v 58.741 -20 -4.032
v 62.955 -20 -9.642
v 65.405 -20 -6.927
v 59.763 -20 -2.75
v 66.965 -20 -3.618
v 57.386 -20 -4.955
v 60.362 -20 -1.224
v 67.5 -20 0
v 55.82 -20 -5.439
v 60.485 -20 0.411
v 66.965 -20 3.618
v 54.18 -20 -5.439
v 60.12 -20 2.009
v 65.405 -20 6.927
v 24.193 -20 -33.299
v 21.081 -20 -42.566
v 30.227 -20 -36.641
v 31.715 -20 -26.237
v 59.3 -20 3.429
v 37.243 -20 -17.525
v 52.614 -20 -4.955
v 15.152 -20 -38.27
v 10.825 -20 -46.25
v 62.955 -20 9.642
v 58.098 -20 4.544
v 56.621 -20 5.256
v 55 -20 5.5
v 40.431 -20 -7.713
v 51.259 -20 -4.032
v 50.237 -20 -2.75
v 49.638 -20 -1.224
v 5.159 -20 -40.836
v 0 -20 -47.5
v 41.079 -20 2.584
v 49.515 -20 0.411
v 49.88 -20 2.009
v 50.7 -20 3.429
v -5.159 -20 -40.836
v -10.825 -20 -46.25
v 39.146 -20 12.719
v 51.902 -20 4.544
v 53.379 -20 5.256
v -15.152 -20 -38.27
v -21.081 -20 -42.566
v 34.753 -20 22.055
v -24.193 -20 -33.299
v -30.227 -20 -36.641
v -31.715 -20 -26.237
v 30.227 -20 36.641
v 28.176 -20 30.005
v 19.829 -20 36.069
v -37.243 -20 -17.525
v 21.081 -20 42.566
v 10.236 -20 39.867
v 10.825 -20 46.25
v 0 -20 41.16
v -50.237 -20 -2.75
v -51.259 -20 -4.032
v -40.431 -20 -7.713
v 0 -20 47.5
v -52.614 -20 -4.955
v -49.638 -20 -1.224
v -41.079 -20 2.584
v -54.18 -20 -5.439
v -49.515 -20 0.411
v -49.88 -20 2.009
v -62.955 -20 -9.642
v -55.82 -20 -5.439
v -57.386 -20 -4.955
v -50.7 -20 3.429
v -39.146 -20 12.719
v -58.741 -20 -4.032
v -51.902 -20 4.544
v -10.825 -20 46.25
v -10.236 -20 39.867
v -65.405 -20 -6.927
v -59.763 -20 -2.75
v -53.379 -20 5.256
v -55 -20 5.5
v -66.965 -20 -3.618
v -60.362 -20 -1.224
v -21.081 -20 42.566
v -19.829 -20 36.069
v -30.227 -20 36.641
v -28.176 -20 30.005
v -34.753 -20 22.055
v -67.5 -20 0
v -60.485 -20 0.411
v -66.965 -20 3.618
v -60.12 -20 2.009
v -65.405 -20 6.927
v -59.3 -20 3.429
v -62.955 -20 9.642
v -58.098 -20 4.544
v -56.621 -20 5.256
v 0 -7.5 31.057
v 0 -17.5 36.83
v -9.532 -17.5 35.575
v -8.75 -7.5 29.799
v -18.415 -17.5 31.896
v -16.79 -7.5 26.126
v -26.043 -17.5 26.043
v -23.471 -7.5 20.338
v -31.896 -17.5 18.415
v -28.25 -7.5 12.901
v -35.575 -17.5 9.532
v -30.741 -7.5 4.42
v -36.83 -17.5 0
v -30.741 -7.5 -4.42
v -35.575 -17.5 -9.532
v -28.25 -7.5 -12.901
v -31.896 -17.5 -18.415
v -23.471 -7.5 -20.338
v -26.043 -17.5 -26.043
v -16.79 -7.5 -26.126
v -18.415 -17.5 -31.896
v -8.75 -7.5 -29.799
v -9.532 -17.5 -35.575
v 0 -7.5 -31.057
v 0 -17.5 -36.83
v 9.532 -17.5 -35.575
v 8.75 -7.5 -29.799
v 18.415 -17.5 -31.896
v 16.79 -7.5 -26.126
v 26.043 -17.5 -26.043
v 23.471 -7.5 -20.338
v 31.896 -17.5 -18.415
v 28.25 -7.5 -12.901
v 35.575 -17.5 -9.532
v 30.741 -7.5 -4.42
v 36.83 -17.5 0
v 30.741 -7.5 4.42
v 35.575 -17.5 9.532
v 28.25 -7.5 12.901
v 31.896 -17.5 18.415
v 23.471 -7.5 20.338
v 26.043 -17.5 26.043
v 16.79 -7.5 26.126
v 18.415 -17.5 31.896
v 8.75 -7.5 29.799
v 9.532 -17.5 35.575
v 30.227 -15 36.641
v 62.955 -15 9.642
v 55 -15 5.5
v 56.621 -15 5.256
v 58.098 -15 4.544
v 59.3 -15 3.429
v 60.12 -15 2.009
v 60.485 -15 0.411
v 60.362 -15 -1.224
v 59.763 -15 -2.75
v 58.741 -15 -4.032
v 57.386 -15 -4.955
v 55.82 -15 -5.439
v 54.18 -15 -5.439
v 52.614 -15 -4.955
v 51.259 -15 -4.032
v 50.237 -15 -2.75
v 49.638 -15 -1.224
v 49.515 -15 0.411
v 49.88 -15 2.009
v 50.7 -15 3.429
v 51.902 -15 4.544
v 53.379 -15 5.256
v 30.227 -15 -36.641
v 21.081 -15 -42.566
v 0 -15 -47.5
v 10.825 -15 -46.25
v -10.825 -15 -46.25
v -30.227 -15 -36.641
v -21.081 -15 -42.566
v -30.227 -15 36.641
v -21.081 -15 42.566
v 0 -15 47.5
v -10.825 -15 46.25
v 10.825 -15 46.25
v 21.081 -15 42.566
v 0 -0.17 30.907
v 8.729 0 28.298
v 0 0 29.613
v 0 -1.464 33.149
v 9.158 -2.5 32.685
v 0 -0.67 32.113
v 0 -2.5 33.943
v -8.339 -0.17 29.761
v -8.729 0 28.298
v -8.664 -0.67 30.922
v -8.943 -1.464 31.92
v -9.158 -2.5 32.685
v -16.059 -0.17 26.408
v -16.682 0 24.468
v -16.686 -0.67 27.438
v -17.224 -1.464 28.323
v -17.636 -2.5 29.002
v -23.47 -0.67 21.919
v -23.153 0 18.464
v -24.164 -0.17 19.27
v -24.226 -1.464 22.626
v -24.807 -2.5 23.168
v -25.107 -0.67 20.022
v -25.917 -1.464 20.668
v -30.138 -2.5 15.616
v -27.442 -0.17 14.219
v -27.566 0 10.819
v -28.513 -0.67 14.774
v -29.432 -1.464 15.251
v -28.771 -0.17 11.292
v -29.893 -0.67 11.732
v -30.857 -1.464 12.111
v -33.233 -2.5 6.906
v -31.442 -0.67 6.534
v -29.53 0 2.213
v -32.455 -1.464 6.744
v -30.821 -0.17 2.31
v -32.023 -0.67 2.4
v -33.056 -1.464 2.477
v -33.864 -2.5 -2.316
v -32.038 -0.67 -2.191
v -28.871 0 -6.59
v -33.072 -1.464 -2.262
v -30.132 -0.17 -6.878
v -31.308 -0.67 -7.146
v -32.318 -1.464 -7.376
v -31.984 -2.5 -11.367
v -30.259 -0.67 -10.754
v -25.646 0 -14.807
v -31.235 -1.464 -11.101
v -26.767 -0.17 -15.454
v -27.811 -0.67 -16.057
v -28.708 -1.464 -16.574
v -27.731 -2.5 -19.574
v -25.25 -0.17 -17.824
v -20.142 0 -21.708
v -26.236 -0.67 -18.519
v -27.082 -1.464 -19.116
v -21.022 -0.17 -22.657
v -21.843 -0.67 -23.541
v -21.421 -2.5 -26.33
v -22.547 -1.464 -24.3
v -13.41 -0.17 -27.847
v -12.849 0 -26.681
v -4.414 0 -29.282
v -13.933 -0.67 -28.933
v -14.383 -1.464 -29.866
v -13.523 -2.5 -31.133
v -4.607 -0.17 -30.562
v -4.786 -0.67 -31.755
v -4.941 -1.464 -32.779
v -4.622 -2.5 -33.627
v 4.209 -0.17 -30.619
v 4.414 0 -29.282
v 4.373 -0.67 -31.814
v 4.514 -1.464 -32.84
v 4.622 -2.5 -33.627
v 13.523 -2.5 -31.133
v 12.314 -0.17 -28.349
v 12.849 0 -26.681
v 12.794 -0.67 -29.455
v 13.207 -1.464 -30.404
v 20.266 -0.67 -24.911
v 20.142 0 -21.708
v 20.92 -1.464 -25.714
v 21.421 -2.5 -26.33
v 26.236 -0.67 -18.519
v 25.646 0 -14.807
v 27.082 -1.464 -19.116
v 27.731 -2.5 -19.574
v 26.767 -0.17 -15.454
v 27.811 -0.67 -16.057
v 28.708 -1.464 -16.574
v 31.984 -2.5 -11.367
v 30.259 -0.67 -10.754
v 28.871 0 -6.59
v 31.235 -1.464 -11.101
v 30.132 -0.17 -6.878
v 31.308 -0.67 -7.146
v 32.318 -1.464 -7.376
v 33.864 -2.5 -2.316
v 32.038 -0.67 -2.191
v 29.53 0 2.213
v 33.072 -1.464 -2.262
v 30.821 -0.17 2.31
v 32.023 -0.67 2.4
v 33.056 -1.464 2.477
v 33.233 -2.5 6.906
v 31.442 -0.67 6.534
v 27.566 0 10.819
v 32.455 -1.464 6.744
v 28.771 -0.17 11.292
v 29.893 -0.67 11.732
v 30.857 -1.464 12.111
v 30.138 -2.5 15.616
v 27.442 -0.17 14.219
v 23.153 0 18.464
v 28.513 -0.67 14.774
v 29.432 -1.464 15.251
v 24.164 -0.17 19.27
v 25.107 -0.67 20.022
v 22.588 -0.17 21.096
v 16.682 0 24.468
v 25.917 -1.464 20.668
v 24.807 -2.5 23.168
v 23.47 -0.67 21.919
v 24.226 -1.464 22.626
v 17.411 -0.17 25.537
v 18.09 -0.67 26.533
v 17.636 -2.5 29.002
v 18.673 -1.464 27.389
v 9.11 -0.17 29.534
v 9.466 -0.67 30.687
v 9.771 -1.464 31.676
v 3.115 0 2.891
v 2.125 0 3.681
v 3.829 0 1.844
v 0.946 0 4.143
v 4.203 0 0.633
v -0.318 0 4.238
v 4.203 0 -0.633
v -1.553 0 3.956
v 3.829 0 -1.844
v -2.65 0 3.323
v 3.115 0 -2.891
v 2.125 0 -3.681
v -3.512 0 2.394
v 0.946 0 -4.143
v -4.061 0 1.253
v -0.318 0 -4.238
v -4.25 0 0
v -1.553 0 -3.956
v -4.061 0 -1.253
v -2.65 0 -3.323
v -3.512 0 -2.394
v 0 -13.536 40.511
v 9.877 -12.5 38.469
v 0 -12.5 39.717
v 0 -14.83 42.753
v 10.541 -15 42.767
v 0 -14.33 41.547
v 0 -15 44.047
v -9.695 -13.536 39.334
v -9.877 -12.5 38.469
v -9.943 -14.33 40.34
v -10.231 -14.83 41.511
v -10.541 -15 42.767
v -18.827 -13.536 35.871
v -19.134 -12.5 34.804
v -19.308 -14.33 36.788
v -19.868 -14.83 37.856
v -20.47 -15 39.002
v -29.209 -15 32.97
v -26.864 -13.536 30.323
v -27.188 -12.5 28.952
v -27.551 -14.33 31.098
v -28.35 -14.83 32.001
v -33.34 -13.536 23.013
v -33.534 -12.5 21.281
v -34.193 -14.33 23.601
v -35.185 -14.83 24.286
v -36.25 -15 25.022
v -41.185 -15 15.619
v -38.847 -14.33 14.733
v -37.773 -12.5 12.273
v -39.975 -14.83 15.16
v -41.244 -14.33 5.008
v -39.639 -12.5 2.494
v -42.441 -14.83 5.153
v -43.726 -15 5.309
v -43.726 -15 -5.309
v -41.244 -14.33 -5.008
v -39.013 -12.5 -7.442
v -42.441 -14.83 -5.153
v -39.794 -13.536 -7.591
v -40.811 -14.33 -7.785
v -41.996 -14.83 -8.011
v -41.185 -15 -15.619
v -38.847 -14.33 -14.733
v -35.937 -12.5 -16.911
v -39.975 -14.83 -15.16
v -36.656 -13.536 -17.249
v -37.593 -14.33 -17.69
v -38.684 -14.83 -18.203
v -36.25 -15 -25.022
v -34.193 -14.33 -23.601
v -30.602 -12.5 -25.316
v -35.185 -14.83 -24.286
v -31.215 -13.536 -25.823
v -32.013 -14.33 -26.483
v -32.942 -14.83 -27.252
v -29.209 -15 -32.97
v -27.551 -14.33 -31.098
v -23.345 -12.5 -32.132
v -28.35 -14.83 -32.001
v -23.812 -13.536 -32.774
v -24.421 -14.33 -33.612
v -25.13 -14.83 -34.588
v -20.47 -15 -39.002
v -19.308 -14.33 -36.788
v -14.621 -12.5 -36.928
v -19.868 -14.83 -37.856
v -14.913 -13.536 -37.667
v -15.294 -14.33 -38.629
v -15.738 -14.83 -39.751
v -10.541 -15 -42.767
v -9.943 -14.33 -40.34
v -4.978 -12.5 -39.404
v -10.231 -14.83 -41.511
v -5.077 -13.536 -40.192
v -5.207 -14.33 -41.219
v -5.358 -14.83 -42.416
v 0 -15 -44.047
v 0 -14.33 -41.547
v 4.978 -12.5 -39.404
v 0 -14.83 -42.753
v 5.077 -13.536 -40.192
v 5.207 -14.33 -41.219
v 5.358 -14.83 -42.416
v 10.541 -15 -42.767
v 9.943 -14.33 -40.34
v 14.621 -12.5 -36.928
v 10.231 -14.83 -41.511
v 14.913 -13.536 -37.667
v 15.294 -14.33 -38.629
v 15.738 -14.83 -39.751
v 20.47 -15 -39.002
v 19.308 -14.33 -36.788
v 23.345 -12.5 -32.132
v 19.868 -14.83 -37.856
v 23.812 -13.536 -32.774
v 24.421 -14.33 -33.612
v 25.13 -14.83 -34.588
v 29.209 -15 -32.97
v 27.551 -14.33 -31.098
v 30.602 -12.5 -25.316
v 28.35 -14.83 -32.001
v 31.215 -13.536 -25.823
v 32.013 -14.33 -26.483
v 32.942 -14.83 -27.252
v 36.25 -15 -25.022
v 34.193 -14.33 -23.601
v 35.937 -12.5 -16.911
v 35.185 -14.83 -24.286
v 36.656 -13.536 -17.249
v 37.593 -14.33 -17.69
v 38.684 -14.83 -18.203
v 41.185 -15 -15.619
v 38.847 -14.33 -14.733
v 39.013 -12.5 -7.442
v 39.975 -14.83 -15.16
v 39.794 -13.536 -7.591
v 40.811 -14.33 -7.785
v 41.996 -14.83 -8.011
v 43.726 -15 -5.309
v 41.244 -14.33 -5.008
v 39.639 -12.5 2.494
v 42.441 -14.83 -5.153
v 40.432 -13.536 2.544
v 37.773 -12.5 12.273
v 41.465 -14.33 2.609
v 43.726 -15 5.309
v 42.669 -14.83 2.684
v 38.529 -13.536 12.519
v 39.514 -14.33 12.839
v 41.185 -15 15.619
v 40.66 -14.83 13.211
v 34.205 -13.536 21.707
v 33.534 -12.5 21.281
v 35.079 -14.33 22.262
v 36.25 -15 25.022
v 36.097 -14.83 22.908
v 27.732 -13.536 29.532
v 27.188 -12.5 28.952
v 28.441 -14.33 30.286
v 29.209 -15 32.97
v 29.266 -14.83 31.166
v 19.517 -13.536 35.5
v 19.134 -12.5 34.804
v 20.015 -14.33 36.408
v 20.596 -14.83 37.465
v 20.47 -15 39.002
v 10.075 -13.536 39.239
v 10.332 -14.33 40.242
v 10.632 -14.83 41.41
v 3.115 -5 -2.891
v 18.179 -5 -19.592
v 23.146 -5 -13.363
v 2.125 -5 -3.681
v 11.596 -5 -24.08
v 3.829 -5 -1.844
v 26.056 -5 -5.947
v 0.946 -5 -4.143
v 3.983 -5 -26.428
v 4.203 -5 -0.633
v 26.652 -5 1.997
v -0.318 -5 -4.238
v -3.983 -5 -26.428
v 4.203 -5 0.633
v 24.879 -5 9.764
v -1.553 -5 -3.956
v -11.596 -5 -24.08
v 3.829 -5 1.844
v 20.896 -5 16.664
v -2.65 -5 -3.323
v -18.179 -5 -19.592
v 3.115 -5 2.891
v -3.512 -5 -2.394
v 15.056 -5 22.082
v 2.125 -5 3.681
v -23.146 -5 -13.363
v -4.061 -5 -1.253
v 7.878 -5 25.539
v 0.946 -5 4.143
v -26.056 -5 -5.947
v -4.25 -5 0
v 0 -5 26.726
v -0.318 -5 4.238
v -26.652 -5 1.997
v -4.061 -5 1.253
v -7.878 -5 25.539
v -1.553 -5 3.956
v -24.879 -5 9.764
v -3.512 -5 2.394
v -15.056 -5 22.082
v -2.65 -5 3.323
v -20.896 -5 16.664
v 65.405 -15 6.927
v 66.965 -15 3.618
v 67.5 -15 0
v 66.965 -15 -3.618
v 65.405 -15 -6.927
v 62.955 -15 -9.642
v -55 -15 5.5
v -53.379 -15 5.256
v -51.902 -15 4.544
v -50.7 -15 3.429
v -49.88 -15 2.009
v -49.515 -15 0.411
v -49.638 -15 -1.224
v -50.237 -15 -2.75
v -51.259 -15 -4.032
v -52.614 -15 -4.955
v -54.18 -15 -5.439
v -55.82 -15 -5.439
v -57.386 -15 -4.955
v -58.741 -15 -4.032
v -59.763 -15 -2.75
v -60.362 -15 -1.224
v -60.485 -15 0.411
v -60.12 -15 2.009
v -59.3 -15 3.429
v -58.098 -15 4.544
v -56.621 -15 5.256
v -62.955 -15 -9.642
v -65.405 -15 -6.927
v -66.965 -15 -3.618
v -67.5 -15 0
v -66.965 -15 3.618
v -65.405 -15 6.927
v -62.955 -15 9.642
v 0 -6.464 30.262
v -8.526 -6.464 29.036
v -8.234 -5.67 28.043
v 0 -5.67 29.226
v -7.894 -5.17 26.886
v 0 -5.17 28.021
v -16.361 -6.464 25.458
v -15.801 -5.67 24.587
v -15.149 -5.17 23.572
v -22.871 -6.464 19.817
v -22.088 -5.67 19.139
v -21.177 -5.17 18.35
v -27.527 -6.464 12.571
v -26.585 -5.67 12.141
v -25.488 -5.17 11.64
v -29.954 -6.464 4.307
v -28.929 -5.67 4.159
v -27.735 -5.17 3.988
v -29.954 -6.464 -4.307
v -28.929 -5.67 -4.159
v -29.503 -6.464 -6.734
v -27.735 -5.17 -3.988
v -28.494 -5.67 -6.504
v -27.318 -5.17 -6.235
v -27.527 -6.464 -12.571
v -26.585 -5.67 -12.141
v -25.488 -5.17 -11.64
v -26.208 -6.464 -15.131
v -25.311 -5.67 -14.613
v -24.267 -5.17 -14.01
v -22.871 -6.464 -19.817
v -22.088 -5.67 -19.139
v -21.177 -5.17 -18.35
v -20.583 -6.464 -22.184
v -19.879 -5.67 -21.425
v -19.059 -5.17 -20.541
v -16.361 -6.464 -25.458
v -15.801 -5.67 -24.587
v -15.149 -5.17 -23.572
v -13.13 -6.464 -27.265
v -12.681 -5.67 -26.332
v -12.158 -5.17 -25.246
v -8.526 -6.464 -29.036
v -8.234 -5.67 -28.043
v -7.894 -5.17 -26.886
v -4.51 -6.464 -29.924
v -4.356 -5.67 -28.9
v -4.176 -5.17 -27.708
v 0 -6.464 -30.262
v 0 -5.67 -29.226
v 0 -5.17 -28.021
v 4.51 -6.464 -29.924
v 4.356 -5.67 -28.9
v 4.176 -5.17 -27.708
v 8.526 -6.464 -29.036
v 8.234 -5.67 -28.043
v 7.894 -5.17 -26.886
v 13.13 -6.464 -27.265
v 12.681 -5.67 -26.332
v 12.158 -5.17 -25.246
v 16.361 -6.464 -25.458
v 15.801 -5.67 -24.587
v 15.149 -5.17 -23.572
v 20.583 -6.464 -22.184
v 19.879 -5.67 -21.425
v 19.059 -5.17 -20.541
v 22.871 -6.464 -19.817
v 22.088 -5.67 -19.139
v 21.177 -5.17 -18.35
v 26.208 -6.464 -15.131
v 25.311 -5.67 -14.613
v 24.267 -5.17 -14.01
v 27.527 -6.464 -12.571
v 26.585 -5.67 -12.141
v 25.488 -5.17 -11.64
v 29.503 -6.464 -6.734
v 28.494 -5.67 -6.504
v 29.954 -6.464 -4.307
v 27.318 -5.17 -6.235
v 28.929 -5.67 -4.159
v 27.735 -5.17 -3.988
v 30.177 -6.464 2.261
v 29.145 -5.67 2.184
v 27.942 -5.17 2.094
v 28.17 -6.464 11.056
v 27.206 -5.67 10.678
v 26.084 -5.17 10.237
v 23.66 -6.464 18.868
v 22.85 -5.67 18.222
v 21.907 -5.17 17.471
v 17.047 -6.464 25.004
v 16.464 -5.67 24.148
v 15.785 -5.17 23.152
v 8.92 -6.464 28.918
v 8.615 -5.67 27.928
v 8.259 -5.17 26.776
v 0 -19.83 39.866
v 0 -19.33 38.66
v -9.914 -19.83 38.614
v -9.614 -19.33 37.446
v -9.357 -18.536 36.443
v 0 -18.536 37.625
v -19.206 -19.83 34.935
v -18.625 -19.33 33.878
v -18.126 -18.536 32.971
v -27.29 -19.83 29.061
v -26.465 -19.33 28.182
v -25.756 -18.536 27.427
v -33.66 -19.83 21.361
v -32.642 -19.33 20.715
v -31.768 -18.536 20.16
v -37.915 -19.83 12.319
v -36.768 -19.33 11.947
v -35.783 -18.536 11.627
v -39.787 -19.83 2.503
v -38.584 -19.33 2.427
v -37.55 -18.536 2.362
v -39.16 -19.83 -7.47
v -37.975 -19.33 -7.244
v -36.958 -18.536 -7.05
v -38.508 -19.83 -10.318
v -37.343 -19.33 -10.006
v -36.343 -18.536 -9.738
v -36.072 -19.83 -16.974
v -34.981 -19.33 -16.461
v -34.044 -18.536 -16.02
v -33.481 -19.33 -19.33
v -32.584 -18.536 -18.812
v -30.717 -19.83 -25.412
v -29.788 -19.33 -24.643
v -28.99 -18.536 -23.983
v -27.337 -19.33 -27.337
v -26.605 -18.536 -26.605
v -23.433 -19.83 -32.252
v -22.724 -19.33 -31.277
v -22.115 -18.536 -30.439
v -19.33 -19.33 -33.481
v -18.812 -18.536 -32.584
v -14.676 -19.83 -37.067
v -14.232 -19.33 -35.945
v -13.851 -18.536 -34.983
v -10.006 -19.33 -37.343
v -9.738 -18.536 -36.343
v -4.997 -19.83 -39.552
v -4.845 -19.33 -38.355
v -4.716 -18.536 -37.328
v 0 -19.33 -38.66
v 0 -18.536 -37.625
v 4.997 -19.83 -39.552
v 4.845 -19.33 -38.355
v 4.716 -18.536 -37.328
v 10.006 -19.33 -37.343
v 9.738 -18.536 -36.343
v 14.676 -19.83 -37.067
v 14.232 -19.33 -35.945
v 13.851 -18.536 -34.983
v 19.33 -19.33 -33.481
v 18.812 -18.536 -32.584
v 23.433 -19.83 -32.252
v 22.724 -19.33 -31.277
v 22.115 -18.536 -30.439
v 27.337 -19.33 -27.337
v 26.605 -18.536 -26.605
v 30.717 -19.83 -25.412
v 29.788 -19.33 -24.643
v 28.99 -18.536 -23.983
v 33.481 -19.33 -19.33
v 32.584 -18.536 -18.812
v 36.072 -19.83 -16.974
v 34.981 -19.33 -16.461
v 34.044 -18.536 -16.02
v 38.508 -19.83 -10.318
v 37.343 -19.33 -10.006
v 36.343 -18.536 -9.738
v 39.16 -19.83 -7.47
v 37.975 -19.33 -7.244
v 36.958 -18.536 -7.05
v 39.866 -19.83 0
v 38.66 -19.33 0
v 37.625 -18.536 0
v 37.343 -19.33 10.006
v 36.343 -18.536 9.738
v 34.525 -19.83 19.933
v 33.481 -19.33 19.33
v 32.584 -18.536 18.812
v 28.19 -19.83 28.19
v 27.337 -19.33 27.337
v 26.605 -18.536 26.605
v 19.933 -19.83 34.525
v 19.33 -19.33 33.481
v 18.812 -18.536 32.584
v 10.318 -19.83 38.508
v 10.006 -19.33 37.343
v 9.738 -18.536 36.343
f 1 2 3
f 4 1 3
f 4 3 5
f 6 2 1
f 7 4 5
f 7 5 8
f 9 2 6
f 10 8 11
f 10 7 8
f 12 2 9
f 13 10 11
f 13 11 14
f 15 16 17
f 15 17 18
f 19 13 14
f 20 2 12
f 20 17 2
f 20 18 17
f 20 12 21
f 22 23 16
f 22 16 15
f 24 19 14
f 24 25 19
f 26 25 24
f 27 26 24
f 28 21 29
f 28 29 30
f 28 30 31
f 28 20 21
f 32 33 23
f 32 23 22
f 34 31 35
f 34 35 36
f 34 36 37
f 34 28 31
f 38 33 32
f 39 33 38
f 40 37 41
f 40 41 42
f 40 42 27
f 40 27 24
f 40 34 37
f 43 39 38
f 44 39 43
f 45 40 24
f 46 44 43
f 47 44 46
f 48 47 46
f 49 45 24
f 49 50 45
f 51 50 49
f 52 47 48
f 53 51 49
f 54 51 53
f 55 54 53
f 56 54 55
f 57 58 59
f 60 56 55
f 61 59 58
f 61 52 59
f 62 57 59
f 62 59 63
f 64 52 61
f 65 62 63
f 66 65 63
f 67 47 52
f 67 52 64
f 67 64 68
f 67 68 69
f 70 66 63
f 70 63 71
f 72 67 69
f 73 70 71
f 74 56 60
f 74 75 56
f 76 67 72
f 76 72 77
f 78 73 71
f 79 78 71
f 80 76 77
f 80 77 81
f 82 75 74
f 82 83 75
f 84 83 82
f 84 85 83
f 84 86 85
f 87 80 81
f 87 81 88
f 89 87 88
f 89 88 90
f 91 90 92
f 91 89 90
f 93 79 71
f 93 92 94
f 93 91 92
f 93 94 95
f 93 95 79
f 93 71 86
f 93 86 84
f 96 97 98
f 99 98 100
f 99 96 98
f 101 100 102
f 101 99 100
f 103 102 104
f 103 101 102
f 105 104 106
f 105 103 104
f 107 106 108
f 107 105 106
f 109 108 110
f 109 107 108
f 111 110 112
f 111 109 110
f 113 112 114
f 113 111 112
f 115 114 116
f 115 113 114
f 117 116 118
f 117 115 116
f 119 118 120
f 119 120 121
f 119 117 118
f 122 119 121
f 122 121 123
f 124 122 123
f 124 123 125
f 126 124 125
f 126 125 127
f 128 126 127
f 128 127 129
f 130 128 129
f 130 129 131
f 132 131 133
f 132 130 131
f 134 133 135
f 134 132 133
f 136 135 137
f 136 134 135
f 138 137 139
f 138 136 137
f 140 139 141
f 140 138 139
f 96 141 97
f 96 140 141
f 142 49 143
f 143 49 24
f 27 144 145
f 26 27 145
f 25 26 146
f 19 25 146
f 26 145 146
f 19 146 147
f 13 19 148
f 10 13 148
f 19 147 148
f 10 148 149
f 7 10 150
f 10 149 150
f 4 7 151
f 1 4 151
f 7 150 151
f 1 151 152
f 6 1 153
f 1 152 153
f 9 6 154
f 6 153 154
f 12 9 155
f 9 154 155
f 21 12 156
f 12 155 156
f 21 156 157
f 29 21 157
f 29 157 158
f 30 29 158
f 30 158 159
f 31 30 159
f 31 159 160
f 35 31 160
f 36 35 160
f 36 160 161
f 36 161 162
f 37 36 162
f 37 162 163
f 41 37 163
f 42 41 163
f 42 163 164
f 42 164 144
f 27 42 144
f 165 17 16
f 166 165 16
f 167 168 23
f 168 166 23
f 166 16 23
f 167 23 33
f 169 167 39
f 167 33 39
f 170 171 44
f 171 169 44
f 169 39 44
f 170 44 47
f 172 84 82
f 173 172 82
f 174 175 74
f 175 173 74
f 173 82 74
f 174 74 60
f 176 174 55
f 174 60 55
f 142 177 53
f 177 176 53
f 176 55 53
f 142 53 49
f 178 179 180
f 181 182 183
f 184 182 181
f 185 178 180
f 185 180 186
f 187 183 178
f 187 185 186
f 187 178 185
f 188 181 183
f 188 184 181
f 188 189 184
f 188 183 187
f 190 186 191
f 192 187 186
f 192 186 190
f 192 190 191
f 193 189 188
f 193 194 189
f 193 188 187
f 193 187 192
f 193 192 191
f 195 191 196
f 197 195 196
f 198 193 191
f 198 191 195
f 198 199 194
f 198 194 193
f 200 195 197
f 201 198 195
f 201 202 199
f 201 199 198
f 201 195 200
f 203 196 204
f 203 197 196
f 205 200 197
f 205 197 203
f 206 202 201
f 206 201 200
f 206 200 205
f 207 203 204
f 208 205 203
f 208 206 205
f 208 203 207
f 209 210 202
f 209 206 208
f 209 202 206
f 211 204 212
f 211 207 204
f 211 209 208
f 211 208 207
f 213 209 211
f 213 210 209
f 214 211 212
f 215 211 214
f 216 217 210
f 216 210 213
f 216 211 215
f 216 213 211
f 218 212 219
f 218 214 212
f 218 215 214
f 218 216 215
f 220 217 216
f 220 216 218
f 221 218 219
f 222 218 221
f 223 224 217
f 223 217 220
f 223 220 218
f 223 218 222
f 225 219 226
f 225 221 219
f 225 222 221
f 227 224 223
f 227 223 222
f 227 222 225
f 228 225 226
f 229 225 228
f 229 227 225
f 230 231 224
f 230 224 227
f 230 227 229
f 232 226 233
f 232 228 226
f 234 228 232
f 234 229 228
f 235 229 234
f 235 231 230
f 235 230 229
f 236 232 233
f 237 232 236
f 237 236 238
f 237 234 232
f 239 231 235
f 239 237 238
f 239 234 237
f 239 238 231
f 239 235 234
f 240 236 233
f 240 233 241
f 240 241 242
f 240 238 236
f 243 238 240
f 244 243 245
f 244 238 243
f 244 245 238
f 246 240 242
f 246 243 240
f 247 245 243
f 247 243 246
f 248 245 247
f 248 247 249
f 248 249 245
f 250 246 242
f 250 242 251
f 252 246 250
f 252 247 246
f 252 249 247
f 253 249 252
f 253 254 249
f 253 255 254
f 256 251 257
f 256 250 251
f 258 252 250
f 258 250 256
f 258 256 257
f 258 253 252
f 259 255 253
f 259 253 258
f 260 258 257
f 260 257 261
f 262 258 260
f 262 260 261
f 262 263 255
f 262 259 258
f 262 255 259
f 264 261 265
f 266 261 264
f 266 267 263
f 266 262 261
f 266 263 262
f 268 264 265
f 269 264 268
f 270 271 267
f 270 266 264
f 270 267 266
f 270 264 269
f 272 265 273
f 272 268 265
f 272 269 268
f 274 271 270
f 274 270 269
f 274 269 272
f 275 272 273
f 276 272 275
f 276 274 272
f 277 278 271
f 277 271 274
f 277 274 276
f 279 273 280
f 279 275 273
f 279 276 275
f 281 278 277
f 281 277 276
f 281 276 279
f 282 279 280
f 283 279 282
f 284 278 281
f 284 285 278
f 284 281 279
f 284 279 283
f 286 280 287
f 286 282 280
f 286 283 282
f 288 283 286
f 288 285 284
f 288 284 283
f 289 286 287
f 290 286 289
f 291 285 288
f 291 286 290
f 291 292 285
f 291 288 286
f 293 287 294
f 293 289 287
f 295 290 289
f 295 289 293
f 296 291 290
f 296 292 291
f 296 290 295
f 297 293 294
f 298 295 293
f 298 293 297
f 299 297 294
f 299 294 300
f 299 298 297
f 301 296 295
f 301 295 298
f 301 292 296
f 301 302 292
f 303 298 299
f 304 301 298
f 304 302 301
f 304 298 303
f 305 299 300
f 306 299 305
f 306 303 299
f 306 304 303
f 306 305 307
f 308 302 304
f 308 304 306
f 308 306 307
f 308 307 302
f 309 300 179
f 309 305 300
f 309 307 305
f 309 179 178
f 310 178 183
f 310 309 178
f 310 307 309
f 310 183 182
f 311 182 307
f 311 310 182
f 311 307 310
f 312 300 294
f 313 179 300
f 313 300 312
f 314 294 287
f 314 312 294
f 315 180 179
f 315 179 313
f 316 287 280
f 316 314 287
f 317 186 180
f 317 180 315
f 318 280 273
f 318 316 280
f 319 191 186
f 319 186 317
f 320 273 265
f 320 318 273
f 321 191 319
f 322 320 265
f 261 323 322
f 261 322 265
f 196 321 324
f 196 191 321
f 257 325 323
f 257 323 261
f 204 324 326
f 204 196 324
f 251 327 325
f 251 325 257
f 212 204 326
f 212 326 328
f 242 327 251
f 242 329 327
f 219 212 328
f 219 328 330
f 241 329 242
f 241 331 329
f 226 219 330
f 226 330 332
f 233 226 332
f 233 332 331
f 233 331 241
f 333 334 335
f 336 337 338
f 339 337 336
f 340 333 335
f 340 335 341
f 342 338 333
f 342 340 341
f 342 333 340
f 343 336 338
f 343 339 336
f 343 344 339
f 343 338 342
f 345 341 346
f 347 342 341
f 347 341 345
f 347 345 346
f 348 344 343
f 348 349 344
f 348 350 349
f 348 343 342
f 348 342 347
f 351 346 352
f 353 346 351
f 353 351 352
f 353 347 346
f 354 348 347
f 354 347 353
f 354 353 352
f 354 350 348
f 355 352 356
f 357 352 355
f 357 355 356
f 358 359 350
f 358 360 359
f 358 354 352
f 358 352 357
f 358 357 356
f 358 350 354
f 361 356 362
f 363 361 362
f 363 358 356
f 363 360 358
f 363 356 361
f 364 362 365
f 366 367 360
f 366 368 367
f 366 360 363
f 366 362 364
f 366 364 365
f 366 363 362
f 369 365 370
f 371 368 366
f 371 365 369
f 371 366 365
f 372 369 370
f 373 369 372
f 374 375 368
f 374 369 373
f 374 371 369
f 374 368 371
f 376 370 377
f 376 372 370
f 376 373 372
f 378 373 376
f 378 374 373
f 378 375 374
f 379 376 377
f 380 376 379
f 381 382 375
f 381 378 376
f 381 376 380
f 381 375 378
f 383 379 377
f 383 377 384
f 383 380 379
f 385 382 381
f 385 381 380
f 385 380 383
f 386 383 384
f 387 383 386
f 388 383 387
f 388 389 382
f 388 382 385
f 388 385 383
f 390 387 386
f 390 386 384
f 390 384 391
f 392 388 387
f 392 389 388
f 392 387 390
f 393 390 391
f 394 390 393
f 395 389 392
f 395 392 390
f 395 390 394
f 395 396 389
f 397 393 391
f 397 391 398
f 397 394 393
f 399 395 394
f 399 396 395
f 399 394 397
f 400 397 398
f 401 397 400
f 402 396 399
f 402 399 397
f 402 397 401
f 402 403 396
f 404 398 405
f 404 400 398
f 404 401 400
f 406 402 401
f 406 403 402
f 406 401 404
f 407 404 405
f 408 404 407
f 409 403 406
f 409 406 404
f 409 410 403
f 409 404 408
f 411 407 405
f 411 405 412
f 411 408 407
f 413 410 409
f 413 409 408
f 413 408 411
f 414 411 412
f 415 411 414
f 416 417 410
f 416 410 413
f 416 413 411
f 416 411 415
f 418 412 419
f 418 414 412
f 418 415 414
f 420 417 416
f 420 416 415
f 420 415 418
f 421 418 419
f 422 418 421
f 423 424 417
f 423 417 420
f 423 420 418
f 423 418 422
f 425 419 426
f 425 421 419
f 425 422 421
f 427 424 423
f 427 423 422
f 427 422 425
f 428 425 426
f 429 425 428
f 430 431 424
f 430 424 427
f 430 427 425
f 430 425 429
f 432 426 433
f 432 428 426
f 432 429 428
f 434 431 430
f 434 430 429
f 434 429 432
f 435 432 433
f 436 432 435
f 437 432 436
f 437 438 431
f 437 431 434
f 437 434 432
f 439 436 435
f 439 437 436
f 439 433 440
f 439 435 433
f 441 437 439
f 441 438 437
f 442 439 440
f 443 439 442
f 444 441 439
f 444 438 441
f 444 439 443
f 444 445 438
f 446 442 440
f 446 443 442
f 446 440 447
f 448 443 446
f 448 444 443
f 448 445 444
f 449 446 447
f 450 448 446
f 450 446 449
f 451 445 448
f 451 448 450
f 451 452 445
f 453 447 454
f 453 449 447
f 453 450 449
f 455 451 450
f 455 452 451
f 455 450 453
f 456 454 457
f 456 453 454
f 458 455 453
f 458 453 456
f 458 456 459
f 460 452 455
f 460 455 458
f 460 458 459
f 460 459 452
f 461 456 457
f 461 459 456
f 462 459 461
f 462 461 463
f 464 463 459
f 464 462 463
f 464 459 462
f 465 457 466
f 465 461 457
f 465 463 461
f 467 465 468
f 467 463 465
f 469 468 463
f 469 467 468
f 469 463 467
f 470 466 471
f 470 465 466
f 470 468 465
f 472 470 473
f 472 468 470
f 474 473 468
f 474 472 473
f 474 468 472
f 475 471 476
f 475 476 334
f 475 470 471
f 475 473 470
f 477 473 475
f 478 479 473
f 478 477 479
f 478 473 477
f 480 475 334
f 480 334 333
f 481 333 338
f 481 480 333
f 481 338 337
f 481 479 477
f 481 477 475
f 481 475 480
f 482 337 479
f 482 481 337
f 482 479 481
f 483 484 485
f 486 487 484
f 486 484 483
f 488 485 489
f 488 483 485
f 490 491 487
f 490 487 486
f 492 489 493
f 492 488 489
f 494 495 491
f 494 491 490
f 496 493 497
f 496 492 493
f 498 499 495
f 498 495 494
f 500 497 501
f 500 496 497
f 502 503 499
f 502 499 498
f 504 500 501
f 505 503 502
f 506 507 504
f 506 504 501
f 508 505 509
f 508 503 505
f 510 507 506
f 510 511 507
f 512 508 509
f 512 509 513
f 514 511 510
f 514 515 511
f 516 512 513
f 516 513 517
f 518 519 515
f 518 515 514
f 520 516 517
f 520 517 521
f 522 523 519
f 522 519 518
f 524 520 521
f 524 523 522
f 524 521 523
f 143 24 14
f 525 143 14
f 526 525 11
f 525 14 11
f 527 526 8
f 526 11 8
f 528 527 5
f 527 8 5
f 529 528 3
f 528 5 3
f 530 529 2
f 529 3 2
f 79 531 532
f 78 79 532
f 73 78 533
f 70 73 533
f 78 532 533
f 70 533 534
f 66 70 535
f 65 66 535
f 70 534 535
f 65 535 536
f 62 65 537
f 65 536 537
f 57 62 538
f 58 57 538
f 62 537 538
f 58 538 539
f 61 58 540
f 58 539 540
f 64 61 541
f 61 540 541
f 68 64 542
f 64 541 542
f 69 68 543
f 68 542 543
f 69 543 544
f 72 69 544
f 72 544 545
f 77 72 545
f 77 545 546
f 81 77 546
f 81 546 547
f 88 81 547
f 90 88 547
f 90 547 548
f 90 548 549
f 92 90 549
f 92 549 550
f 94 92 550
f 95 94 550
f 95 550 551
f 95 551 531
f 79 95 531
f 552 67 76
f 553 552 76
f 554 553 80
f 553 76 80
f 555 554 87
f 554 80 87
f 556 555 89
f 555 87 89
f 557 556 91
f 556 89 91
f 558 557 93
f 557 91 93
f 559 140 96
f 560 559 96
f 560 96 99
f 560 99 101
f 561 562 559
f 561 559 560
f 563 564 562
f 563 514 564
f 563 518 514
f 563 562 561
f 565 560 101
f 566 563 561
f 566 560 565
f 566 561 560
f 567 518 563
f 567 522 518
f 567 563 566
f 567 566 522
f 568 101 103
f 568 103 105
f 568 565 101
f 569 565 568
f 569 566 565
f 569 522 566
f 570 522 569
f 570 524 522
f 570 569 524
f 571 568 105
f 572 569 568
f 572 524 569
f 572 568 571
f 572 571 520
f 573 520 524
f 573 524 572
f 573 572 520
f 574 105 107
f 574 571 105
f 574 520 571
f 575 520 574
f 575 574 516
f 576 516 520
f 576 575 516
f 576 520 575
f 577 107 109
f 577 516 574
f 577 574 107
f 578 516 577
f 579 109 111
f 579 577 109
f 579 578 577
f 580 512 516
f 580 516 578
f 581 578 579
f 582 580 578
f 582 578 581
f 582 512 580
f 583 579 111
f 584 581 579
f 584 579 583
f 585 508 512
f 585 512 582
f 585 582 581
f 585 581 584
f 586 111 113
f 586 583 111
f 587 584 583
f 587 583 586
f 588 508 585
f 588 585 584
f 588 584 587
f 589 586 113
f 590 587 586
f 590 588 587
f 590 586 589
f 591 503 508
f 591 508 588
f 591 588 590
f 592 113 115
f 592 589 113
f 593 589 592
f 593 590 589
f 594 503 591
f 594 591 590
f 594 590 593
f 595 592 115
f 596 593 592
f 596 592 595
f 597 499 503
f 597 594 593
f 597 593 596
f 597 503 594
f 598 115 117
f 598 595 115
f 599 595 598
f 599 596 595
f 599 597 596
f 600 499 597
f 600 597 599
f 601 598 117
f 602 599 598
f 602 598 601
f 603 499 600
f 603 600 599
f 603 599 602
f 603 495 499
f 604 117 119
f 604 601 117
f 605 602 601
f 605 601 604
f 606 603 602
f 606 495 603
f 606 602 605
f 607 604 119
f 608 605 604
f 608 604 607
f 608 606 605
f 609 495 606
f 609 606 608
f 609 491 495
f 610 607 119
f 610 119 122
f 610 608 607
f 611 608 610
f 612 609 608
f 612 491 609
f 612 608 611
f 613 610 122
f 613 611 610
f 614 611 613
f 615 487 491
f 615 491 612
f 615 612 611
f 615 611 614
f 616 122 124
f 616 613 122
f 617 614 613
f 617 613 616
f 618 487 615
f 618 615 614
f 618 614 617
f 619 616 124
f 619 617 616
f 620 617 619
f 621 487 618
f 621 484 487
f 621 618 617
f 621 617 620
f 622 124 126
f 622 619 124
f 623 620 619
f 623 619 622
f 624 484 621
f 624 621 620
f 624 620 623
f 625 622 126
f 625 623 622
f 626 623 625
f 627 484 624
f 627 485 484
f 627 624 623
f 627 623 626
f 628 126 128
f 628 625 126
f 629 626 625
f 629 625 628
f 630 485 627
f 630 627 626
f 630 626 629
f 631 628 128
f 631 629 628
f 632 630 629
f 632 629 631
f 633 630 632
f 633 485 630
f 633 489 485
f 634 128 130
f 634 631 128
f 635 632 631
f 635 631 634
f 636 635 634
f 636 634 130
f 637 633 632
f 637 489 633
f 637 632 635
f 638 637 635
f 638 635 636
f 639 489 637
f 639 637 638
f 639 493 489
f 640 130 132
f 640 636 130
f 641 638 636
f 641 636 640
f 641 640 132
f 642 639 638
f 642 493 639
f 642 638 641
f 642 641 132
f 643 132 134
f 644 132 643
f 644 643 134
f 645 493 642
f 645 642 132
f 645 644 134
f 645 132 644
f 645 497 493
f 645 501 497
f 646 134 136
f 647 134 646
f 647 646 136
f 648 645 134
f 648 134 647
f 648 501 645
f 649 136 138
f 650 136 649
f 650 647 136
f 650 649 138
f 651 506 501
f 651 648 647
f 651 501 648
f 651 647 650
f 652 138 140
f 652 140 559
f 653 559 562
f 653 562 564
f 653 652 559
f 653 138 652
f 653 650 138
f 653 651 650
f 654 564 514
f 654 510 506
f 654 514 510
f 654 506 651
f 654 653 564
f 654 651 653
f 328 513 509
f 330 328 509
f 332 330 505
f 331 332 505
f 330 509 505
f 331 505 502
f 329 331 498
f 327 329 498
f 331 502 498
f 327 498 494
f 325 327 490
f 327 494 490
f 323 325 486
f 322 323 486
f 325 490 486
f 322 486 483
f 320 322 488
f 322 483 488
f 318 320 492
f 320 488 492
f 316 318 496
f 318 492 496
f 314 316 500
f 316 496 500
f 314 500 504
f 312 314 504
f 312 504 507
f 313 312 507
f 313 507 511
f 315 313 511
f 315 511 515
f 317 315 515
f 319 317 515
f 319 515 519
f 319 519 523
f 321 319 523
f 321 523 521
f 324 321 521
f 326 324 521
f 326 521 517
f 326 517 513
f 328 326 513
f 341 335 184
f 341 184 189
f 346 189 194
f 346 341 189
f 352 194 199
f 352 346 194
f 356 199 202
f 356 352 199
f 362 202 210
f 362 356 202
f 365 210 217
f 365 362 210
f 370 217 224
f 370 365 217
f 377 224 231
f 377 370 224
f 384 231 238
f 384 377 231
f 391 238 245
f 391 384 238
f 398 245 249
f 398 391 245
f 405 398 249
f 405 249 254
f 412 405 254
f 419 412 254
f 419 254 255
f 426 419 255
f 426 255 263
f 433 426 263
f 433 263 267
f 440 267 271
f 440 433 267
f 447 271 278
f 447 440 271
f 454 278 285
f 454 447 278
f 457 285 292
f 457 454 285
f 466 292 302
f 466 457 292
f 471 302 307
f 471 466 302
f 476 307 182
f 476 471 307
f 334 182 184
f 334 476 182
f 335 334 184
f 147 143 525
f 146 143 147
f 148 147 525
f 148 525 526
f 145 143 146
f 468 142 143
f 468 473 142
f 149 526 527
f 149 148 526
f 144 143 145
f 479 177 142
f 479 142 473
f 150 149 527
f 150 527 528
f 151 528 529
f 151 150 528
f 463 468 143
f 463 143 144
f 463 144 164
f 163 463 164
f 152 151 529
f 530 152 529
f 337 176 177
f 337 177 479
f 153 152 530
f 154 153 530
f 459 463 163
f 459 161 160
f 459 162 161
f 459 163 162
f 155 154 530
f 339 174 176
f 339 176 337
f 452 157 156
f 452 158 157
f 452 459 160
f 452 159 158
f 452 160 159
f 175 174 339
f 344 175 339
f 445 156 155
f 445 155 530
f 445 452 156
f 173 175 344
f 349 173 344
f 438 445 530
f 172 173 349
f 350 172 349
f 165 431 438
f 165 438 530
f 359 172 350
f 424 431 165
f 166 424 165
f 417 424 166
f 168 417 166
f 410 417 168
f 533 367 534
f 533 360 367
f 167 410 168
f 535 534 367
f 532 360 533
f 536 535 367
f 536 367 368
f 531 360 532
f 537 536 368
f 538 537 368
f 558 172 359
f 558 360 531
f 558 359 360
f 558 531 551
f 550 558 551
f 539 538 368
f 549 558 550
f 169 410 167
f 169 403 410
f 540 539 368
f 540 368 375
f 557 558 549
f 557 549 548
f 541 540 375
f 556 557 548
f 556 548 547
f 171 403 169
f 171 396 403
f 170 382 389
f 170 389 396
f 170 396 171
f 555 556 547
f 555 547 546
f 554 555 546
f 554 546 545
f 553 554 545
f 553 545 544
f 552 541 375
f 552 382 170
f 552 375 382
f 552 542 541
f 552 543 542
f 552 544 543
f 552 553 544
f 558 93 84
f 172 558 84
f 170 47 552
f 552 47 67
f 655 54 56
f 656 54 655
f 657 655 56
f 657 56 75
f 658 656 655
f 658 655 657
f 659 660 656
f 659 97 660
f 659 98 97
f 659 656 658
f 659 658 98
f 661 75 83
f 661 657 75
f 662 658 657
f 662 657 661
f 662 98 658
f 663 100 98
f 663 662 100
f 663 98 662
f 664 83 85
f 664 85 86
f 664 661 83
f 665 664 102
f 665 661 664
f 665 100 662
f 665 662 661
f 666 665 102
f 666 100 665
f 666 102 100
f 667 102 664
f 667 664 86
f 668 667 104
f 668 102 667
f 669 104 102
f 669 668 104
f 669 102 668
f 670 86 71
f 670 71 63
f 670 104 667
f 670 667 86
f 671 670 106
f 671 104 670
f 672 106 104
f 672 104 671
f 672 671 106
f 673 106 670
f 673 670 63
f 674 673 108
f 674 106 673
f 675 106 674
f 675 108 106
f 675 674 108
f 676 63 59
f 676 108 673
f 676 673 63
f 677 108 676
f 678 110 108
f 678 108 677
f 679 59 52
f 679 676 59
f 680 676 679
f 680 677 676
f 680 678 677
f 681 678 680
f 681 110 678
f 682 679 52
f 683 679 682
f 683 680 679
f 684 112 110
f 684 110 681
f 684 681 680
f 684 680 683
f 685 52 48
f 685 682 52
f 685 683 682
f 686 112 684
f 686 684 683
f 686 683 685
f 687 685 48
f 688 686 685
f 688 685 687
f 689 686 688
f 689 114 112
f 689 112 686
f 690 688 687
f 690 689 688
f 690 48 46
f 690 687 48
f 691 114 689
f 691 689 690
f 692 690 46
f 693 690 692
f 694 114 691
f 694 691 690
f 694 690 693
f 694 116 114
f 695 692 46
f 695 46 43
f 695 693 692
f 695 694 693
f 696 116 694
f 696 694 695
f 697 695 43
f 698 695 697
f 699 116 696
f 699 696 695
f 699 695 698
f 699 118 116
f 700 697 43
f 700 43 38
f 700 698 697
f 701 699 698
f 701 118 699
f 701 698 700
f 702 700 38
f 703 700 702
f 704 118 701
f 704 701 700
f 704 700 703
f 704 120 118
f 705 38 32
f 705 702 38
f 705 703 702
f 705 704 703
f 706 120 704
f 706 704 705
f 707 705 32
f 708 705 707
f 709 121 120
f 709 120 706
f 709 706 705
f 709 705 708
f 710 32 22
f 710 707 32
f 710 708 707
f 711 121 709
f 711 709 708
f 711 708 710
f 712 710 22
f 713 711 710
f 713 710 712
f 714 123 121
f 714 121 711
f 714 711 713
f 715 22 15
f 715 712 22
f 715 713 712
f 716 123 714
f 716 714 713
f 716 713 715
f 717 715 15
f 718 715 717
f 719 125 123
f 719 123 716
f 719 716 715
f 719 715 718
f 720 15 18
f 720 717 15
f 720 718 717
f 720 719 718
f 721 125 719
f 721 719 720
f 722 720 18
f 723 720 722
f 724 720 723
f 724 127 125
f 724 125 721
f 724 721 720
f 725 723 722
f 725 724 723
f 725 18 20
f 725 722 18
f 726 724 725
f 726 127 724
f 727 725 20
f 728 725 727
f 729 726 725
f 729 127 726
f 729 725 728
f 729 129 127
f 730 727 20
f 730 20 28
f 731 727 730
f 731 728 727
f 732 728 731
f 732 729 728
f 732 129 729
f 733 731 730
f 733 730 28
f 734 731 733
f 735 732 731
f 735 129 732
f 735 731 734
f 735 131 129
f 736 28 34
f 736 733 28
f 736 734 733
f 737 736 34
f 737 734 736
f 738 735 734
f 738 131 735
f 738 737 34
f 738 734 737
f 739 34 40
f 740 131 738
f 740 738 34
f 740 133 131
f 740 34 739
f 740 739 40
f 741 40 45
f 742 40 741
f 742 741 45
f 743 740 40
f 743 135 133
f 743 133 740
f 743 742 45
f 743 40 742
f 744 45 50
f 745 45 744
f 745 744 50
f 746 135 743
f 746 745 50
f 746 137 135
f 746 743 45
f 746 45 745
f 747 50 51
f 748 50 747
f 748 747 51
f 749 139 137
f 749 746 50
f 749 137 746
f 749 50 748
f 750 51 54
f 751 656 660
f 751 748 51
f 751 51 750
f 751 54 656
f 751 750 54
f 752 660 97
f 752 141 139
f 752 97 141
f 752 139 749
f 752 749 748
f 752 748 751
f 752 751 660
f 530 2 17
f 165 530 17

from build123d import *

# Parameters (mm, degrees)
ZAOKR_GLENIE1_R                 = 5
SZKIC2_R                        = 5.5
WYTNIJ_WYCI_GNI_CIE1_DEPTH      = 98.532046016
OTW_R_GWINTOWANY_M101_D         = 8.5
OTW_R_GWINTOWANY_M101_DEPTH     = 17.5
OTW_R_GWINTOWANY_M101_TIP       = 2.553657631
WYTNIJ_WYCI_GNI_CIE2_DEPTH      = 97.63074045
WYTNIJ_WYCI_GNI_CIE2_DEPTH_BACK = 97.63074045
SZKIC5_OUTSIDE_W                = 175.392
SZKIC5_OUTSIDE_H                = 175.392


with BuildPart() as part:
    # Szkic1 → Obrót1 (revolve)
    with BuildSketch(Plane.XY, mode=Mode.PRIVATE) as obr_t1_sk:
        Polygon((0, 0), (-32.5, 0), (-41.160254038, -15), (-67.5, -15), (-67.5, -20), (-38.273502692, -20), (-29.613248654, -5), (0, -5), align=None)
    revolve(obr_t1_sk.sketch.rotate(Axis((0, 100.333333333, 0), (0, -1, 0)), 270), axis=Axis((0, 100.333333333, 0), (0, -1, 0)))

    # Zaokrąglenie1
    zaokr_glenie1_edges = [part.edges().sort_by_distance(p)[0] for p in [
        (0, -5, -29.613248654),
        (0, -20, -38.273502692),
        (0, -15, -41.160254038),
        (0, 0, -32.5),
    ]]
    fillet(zaokr_glenie1_edges, radius=ZAOKR_GLENIE1_R)

    # Szkic2 → Wytnij-wyciągnięcie1 (cut, through all)
    with BuildSketch(Plane(origin=(0, 0, 0), x_dir=(1, 0, 0), z_dir=(0, 1, 0))):
        with Locations(Location((-55, 0, 0), (0, 0, 270))):
            Circle(SZKIC2_R)
        with Locations(Location((55, 0, 0), (0, 0, 270))):
            Circle(SZKIC2_R)
    extrude(amount=-WYTNIJ_WYCI_GNI_CIE1_DEPTH, mode=Mode.SUBTRACT)

    # Otwór gwintowany M101
    with Locations(Plane(origin=(0, 0, 0), x_dir=(1, 0, 0), z_dir=(0, 1, 0))):
        with Locations((0, 0)):
            Hole(OTW_R_GWINTOWANY_M101_D / 2, depth=OTW_R_GWINTOWANY_M101_DEPTH)
            with Locations((0, 0, -(OTW_R_GWINTOWANY_M101_DEPTH + OTW_R_GWINTOWANY_M101_TIP / 2))):  # 118° drill point
                Cone(0, OTW_R_GWINTOWANY_M101_D / 2, OTW_R_GWINTOWANY_M101_TIP, mode=Mode.SUBTRACT)

    # Szkic5 outside → Wytnij-wyciągnięcie2 (cut, two sides: drawn at the far end of the back side and taken through both)
    with BuildSketch(Plane(origin=(0, -15, 0), x_dir=(1, 0, 0), z_dir=(0, 1, 0)).offset(-WYTNIJ_WYCI_GNI_CIE2_DEPTH_BACK)):
        Rectangle(SZKIC5_OUTSIDE_W, SZKIC5_OUTSIDE_H)
        with BuildLine():
            Line((62.954545455, 9.642365198), (30.227272727, 36.640987752))
            ThreePointArc((30.227272727, 36.640987752), (0, 47.5), (-30.227272727, 36.640987752))
            Line((-30.227272727, 36.640987752), (-62.954545455, 9.642365198))
            ThreePointArc((-62.954545455, 9.642365198), (-67.5, 0), (-62.954545455, -9.642365198))
            Line((-62.954545455, -9.642365198), (-30.227272727, -36.640987752))
            ThreePointArc((-30.227272727, -36.640987752), (0, -47.5), (30.227272727, -36.640987752))
            Line((30.227272727, -36.640987752), (62.954545455, -9.642365198))
            ThreePointArc((62.954545455, -9.642365198), (67.5, 0), (62.954545455, 9.642365198))
        make_face(mode=Mode.SUBTRACT)
    extrude(amount=WYTNIJ_WYCI_GNI_CIE2_DEPTH + WYTNIJ_WYCI_GNI_CIE2_DEPTH_BACK, mode=Mode.SUBTRACT)


solid = part.part
